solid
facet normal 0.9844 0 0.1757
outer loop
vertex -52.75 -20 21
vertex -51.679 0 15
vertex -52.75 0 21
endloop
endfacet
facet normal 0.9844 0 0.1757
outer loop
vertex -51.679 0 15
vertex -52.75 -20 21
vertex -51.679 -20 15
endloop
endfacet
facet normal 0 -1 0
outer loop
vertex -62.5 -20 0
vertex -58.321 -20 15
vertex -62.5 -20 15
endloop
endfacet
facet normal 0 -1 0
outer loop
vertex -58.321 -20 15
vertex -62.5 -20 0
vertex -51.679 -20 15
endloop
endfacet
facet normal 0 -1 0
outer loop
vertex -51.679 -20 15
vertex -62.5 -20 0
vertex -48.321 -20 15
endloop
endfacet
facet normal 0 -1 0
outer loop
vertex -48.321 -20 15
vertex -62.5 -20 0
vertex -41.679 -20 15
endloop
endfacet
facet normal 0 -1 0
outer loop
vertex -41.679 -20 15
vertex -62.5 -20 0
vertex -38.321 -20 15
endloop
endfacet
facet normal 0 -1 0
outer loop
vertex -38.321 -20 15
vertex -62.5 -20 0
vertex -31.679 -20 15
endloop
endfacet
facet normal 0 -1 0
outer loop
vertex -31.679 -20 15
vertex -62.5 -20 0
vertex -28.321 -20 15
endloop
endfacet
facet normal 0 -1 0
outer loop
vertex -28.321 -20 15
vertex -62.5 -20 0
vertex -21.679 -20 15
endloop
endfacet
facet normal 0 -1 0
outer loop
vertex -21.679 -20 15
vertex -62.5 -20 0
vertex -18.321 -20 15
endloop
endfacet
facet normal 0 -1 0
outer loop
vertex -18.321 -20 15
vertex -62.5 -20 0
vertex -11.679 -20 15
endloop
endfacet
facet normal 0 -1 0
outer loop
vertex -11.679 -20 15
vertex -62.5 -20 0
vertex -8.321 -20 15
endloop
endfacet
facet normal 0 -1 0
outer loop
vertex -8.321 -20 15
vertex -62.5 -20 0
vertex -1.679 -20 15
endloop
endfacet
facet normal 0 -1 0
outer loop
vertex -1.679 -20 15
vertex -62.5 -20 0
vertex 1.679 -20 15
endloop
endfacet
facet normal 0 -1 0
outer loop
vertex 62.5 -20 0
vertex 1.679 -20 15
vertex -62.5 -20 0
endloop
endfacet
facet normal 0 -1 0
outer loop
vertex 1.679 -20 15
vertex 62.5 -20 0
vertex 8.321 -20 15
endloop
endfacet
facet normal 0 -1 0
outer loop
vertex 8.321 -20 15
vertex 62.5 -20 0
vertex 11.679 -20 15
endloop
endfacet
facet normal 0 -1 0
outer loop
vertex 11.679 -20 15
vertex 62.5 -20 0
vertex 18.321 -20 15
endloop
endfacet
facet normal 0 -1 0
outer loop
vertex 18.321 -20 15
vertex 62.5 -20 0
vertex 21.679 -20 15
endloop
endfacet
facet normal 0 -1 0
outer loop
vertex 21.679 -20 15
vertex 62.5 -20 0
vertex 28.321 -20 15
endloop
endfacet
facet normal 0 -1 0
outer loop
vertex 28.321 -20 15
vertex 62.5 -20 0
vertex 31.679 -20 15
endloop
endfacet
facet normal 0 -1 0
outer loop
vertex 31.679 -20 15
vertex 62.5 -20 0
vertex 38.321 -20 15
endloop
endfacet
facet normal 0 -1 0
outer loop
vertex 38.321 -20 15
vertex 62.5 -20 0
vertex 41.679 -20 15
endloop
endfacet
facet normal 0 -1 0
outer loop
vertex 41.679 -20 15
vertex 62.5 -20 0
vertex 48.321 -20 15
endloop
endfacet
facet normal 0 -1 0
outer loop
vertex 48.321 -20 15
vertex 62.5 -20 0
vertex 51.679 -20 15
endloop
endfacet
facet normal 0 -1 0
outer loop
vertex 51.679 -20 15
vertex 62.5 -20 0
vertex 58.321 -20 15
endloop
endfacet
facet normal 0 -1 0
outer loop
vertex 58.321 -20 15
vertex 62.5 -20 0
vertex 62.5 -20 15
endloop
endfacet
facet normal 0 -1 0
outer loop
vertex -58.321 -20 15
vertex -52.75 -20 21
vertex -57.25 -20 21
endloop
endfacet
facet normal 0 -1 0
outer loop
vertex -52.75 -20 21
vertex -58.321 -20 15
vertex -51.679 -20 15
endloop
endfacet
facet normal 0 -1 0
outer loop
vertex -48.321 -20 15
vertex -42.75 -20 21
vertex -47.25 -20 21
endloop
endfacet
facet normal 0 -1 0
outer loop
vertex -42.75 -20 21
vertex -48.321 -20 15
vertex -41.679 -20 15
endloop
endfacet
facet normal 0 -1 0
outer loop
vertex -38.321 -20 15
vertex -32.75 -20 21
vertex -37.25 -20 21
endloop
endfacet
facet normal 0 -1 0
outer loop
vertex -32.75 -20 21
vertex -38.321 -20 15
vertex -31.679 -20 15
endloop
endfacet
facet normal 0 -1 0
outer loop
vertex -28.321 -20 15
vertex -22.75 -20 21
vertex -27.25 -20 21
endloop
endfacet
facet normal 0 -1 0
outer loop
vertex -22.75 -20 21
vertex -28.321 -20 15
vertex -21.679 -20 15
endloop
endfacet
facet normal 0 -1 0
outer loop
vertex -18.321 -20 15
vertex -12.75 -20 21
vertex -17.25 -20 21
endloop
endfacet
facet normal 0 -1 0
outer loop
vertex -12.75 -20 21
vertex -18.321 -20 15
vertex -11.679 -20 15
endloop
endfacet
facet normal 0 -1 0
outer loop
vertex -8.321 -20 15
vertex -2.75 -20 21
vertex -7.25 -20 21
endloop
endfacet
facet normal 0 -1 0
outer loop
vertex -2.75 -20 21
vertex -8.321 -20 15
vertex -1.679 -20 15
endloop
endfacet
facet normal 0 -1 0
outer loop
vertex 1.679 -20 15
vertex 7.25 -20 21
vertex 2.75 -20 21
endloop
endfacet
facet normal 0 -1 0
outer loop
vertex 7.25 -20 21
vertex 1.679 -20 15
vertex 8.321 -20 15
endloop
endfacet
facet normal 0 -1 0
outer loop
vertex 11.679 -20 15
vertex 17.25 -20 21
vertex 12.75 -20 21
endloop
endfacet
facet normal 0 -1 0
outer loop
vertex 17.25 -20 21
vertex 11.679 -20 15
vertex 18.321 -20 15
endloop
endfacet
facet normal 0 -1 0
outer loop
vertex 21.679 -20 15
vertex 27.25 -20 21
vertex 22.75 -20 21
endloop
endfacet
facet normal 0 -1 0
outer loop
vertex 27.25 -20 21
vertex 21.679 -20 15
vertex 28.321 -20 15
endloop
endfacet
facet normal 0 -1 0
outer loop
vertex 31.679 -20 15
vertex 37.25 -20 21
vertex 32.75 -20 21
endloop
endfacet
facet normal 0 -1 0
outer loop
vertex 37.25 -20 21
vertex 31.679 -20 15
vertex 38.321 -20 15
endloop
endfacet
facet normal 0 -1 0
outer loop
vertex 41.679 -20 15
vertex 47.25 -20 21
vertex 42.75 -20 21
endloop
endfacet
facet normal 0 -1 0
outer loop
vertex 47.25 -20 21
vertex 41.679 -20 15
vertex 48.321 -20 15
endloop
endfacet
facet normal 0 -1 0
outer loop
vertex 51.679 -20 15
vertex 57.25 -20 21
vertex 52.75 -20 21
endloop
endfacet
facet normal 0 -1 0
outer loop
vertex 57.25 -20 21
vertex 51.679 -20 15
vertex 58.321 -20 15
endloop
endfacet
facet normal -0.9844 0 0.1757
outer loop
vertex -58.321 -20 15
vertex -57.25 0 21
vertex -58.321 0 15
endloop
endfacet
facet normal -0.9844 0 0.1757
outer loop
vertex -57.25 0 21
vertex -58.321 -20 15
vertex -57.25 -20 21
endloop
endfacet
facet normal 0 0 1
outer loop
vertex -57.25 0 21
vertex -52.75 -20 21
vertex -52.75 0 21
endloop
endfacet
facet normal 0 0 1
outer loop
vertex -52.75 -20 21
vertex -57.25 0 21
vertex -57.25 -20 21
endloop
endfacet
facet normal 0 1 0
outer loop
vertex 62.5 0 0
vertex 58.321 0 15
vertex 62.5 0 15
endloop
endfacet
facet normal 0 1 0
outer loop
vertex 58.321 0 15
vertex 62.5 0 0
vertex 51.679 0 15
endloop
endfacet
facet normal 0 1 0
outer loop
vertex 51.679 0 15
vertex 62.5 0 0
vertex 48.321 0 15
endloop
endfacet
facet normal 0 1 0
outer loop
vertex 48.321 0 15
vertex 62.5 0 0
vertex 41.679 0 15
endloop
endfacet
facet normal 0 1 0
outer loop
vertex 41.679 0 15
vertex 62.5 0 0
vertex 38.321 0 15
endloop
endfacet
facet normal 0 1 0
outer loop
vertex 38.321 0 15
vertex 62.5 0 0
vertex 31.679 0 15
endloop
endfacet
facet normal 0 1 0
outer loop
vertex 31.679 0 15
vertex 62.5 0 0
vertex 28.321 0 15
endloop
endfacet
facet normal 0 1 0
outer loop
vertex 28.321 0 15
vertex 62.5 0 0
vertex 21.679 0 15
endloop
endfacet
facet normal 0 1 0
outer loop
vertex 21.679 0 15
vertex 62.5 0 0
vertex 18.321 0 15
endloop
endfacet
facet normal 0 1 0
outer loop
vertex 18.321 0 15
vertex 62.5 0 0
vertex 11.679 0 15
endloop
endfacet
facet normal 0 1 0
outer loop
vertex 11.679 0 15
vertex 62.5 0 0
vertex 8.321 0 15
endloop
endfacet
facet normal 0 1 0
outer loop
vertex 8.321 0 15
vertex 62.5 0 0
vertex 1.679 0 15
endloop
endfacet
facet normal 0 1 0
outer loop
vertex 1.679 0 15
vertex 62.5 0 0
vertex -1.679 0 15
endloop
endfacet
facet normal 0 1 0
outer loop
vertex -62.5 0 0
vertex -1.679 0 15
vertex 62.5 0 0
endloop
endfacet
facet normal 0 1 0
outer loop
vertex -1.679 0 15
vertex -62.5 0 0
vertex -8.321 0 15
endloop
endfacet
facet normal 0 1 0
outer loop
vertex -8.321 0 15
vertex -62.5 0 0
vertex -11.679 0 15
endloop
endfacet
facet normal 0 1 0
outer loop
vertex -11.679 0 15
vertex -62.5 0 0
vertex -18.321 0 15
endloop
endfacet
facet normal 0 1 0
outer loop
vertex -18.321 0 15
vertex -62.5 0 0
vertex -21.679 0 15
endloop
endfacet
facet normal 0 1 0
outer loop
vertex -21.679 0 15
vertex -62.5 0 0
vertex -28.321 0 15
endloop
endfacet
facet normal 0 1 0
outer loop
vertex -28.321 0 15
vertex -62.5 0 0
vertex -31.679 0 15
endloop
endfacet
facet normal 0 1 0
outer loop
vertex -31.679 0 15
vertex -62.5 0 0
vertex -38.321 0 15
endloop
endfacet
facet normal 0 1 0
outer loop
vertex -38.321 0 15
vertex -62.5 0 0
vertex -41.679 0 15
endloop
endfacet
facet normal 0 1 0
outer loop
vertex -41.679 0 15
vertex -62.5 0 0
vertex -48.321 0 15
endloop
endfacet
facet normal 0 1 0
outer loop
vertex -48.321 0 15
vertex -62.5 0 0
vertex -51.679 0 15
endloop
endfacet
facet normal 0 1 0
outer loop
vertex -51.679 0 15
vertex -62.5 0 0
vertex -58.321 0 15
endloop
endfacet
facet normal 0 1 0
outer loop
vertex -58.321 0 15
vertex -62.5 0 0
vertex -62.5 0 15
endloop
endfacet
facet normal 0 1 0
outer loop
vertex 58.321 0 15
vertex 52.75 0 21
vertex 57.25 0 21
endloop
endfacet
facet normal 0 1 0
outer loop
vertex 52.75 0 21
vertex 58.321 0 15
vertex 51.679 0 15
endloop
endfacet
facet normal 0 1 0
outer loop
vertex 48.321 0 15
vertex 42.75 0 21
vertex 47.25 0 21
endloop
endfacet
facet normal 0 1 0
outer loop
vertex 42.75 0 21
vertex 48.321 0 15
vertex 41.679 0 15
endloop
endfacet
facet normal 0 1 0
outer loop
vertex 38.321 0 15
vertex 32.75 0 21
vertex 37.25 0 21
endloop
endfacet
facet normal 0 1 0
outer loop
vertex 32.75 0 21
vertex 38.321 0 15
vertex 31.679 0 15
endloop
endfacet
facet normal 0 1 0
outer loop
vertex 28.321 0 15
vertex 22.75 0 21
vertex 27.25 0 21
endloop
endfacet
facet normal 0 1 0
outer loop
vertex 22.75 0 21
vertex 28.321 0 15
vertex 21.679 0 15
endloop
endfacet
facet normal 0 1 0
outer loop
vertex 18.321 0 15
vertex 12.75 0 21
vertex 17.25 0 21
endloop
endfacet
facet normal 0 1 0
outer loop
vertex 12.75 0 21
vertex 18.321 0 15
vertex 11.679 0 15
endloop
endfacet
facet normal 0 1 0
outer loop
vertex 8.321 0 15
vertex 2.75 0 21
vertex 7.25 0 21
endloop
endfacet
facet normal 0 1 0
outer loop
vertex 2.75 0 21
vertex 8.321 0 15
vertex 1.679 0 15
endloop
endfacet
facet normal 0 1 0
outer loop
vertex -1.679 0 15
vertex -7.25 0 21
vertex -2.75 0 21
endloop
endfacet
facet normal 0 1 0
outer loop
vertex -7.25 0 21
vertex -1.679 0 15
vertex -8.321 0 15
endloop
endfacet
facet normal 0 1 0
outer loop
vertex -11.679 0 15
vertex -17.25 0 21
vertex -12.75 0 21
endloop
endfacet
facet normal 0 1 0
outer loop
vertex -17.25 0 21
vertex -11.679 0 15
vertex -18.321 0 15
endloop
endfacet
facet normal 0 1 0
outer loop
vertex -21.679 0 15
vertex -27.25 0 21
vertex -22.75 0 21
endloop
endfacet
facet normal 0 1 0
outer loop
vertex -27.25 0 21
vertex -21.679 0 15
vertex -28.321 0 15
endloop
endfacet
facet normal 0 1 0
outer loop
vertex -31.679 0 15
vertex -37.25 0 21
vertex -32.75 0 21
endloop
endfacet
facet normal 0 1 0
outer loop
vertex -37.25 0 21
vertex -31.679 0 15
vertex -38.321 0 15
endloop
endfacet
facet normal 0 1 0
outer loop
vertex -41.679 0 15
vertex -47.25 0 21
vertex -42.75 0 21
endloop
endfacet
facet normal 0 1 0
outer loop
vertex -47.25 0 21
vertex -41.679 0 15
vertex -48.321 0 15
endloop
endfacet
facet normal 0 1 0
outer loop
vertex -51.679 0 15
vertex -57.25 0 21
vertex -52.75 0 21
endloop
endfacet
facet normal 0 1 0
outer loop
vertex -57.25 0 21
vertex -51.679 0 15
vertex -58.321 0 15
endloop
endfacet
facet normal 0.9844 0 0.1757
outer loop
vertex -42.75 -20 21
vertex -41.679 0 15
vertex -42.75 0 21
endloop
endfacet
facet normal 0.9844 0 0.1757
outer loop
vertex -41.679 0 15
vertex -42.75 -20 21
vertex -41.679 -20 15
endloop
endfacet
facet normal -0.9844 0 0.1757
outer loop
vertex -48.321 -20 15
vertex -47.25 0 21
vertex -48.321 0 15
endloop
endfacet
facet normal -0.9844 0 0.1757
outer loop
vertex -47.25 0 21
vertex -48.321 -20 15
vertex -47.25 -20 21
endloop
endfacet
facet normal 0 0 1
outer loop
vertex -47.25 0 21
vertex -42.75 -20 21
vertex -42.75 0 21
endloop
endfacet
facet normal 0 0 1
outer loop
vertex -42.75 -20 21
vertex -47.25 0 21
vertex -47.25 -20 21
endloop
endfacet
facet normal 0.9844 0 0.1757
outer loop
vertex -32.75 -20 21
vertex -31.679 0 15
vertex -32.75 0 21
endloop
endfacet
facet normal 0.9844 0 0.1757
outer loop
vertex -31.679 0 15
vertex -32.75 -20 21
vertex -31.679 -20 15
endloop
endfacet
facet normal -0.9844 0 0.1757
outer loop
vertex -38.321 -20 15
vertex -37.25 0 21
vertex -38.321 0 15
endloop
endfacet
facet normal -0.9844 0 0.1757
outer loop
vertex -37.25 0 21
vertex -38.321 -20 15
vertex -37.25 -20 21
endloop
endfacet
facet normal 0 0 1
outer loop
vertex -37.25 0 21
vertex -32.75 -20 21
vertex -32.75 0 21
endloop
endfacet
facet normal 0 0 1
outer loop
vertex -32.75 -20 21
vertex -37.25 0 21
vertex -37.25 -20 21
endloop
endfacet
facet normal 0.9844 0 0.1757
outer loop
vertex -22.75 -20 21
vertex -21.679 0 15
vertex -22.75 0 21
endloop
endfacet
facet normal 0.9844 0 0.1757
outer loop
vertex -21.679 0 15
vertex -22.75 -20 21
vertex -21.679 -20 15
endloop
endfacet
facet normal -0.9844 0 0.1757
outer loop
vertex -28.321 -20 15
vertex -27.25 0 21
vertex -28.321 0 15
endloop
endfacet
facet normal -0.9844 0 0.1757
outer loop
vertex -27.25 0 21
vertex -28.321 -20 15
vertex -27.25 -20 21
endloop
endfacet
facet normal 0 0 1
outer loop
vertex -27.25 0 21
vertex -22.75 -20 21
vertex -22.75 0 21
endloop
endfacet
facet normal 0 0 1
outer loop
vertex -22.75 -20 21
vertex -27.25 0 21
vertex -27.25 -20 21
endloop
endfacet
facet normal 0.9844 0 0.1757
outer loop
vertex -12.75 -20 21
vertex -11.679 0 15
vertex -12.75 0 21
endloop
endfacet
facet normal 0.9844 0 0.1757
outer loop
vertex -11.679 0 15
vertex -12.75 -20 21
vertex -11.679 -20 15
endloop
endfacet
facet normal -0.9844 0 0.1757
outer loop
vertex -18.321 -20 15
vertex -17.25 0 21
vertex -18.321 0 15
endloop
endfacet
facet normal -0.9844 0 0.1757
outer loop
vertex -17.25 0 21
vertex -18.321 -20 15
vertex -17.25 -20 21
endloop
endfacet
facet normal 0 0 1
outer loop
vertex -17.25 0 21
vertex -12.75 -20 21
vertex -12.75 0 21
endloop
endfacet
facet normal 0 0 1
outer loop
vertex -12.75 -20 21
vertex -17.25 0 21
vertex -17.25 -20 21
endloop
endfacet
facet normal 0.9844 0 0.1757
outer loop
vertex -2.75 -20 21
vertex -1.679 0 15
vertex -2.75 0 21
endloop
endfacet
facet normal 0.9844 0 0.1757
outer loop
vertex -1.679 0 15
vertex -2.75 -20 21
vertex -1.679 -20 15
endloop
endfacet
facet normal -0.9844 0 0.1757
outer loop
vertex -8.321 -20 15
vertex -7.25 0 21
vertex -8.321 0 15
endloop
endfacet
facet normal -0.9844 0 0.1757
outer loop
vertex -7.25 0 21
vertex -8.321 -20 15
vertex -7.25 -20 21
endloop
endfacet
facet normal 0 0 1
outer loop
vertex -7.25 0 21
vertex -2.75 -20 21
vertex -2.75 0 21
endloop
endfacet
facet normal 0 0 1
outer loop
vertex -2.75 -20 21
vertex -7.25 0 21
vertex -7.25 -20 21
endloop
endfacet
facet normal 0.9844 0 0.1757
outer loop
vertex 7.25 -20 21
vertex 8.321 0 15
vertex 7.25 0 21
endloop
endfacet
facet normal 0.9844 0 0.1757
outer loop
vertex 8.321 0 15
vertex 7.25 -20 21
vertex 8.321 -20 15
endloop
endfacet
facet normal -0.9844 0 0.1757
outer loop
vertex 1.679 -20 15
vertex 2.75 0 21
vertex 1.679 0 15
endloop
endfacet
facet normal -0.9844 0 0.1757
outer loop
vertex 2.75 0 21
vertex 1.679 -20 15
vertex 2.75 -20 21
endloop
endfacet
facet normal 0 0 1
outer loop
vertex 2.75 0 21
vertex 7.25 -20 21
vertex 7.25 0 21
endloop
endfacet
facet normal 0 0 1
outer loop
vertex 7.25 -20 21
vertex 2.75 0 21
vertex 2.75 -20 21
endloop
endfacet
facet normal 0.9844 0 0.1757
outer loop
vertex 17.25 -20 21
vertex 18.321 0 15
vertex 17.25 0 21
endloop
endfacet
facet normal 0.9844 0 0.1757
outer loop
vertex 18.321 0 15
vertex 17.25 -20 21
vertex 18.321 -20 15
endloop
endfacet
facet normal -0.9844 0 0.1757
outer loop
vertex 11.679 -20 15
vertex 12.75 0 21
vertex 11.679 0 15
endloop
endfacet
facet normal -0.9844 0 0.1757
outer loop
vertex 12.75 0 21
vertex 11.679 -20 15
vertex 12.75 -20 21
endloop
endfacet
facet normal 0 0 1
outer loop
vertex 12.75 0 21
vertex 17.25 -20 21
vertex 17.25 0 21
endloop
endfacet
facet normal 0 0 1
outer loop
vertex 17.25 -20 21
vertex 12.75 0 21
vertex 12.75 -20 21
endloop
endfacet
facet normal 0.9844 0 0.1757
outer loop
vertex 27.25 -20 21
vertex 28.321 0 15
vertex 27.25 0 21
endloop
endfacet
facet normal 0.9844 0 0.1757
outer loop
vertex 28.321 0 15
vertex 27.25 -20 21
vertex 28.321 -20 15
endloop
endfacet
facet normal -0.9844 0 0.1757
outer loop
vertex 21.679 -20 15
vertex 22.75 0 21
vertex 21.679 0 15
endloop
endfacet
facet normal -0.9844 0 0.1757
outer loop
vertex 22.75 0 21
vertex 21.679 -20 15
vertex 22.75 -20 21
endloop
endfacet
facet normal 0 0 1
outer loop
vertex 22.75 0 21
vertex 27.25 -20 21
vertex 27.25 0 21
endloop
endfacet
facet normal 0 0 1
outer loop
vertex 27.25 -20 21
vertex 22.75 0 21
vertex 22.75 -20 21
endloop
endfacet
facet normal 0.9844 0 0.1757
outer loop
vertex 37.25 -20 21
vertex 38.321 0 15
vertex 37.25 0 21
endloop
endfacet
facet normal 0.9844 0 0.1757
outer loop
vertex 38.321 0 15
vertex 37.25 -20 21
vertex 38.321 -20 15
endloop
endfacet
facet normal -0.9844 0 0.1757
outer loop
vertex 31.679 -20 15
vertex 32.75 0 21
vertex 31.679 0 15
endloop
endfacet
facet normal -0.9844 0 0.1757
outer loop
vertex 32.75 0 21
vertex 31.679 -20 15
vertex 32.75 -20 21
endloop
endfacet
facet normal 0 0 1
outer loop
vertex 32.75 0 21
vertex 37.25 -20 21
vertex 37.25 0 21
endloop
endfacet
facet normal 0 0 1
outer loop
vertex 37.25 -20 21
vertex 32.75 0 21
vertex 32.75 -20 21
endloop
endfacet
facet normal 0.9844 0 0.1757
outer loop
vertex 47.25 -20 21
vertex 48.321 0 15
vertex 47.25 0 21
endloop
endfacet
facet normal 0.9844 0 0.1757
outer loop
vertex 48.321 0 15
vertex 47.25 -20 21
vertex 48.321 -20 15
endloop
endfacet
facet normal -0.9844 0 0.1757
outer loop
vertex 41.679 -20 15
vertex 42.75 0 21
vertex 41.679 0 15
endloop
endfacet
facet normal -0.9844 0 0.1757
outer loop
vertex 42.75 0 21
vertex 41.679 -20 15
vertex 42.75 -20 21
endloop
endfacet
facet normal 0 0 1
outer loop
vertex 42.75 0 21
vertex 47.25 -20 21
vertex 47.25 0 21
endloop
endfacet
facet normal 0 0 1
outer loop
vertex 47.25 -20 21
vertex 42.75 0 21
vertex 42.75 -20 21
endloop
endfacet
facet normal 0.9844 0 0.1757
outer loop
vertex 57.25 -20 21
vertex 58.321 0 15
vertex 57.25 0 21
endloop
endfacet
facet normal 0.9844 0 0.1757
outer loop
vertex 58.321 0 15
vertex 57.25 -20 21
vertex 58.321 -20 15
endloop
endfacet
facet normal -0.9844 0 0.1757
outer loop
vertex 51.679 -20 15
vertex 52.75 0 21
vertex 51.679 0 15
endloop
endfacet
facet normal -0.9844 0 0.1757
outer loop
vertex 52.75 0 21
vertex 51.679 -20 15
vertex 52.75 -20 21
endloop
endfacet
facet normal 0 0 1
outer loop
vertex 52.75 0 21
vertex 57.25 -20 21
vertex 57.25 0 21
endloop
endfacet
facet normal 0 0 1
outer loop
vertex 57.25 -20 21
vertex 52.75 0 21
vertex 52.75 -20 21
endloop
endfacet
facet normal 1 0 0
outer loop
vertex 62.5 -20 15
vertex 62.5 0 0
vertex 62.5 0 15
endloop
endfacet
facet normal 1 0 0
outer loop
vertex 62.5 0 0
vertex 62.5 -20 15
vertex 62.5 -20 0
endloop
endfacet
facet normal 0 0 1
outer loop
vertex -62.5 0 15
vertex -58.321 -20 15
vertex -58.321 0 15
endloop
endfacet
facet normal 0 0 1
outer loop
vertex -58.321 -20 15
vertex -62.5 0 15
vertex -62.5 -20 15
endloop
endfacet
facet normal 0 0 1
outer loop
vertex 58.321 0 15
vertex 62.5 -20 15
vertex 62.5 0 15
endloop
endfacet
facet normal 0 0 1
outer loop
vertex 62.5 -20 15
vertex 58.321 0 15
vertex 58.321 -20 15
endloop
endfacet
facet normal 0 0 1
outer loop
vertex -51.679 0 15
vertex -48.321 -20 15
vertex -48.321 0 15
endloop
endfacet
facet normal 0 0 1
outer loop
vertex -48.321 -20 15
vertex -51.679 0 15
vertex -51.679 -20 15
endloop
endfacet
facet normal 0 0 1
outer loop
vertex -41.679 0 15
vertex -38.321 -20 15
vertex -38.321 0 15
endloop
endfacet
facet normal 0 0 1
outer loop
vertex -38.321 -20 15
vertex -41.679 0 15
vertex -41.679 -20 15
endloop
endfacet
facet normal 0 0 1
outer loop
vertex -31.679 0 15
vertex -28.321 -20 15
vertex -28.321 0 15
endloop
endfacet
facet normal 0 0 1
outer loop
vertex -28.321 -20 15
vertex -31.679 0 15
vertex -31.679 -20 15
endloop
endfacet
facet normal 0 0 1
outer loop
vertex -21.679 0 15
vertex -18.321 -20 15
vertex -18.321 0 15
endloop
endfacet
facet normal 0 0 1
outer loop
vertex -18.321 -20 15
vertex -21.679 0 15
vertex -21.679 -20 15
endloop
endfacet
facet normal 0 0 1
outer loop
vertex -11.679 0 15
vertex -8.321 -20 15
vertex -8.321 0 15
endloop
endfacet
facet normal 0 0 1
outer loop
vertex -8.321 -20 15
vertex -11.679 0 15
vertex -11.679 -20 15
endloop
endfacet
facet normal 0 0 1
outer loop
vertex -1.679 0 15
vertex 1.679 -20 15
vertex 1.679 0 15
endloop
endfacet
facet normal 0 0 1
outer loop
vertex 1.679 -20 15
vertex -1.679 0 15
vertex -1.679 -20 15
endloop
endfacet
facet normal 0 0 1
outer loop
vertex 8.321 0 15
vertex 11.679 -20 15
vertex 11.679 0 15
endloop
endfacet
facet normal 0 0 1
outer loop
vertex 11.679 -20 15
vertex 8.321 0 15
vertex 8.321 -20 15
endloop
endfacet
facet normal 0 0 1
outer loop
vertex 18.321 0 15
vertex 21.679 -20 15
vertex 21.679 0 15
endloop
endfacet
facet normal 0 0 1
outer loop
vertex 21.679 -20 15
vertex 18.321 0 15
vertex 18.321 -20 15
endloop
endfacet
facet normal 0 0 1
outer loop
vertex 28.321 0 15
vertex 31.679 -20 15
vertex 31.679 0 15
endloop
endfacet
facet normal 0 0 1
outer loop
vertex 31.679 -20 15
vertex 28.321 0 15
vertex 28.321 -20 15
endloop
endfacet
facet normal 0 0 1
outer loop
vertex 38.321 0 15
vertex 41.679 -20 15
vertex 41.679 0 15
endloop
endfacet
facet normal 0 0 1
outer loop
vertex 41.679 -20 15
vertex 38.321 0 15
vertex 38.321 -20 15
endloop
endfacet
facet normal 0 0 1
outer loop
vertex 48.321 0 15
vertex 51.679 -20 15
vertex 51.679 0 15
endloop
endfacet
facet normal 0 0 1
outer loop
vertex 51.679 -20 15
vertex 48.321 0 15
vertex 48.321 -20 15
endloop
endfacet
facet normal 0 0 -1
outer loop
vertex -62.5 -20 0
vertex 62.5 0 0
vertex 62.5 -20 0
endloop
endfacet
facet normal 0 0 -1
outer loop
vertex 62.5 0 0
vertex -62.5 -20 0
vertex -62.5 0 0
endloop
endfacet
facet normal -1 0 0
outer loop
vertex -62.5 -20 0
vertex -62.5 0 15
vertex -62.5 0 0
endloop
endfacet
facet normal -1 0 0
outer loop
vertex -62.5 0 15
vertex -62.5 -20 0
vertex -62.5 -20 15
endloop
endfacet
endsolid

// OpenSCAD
$fn = 32;

// ----------------------------------------------------------------------
// Toothed rack, 12 teeth
// 10 mm pitch, 6 mm teeth
// ----------------------------------------------------------------------

// --- parameters (mm) ---
bar_w = 20;     // bar width (Y)
bar_h = 15;     // bar height (Z)
teeth = 12;     // number of teeth
pitch = 10;     // tooth pitch
tooth_h = 6;    // tooth height above the bar
root_w = 7;     // tooth width at the root
crest_w = 4.5;  // tooth width at the crest

// --- derived feature positions (mm) ---
span = (teeth - 1) * pitch;  // = 110   distance between the outer teeth
bar_l = span + root_w + 8;   // = 125   bar length: teeth plus 4 mm at each end
tooth_x = -span / 2;         // = -55   X of the first tooth
height = bar_h + tooth_h;    // = 21   overall height
feature_centers = [
  [tooth_x + 0 * pitch, -bar_w / 2],
  [tooth_x + 1 * pitch, -bar_w / 2],
  [tooth_x + 2 * pitch, -bar_w / 2],
  [tooth_x + 3 * pitch, -bar_w / 2],
  [tooth_x + 4 * pitch, -bar_w / 2],
  [tooth_x + 5 * pitch, -bar_w / 2],
  [tooth_x + 6 * pitch, -bar_w / 2],
  [tooth_x + 7 * pitch, -bar_w / 2],
  [tooth_x + 8 * pitch, -bar_w / 2],
  [tooth_x + 9 * pitch, -bar_w / 2],
  [tooth_x + 10 * pitch, -bar_w / 2],
  [tooth_x + 11 * pitch, -bar_w / 2]
];   // tooth centre line, drives the tooth loop

// bar with a rack of teeth, one extruded trapezoium per centre
module rack_tooth() {
  linear_extrude(height = bar_w)
    polygon(points = [
      [0, 0],
      [root_w, 0],
      [root_w / 2 + crest_w / 2, tooth_h + 1],
      [root_w / 2 - crest_w / 2, tooth_h + 1]
    ]);
}

union() {
  translate([-bar_l / 2, -bar_w, 0]) cube([bar_l, bar_w, bar_h]);
  for (centre = feature_centers)
    translate([centre[0] - root_w / 2, 0, bar_h - 1]) rotate([90, 0, 0]) rack_tooth();
}
